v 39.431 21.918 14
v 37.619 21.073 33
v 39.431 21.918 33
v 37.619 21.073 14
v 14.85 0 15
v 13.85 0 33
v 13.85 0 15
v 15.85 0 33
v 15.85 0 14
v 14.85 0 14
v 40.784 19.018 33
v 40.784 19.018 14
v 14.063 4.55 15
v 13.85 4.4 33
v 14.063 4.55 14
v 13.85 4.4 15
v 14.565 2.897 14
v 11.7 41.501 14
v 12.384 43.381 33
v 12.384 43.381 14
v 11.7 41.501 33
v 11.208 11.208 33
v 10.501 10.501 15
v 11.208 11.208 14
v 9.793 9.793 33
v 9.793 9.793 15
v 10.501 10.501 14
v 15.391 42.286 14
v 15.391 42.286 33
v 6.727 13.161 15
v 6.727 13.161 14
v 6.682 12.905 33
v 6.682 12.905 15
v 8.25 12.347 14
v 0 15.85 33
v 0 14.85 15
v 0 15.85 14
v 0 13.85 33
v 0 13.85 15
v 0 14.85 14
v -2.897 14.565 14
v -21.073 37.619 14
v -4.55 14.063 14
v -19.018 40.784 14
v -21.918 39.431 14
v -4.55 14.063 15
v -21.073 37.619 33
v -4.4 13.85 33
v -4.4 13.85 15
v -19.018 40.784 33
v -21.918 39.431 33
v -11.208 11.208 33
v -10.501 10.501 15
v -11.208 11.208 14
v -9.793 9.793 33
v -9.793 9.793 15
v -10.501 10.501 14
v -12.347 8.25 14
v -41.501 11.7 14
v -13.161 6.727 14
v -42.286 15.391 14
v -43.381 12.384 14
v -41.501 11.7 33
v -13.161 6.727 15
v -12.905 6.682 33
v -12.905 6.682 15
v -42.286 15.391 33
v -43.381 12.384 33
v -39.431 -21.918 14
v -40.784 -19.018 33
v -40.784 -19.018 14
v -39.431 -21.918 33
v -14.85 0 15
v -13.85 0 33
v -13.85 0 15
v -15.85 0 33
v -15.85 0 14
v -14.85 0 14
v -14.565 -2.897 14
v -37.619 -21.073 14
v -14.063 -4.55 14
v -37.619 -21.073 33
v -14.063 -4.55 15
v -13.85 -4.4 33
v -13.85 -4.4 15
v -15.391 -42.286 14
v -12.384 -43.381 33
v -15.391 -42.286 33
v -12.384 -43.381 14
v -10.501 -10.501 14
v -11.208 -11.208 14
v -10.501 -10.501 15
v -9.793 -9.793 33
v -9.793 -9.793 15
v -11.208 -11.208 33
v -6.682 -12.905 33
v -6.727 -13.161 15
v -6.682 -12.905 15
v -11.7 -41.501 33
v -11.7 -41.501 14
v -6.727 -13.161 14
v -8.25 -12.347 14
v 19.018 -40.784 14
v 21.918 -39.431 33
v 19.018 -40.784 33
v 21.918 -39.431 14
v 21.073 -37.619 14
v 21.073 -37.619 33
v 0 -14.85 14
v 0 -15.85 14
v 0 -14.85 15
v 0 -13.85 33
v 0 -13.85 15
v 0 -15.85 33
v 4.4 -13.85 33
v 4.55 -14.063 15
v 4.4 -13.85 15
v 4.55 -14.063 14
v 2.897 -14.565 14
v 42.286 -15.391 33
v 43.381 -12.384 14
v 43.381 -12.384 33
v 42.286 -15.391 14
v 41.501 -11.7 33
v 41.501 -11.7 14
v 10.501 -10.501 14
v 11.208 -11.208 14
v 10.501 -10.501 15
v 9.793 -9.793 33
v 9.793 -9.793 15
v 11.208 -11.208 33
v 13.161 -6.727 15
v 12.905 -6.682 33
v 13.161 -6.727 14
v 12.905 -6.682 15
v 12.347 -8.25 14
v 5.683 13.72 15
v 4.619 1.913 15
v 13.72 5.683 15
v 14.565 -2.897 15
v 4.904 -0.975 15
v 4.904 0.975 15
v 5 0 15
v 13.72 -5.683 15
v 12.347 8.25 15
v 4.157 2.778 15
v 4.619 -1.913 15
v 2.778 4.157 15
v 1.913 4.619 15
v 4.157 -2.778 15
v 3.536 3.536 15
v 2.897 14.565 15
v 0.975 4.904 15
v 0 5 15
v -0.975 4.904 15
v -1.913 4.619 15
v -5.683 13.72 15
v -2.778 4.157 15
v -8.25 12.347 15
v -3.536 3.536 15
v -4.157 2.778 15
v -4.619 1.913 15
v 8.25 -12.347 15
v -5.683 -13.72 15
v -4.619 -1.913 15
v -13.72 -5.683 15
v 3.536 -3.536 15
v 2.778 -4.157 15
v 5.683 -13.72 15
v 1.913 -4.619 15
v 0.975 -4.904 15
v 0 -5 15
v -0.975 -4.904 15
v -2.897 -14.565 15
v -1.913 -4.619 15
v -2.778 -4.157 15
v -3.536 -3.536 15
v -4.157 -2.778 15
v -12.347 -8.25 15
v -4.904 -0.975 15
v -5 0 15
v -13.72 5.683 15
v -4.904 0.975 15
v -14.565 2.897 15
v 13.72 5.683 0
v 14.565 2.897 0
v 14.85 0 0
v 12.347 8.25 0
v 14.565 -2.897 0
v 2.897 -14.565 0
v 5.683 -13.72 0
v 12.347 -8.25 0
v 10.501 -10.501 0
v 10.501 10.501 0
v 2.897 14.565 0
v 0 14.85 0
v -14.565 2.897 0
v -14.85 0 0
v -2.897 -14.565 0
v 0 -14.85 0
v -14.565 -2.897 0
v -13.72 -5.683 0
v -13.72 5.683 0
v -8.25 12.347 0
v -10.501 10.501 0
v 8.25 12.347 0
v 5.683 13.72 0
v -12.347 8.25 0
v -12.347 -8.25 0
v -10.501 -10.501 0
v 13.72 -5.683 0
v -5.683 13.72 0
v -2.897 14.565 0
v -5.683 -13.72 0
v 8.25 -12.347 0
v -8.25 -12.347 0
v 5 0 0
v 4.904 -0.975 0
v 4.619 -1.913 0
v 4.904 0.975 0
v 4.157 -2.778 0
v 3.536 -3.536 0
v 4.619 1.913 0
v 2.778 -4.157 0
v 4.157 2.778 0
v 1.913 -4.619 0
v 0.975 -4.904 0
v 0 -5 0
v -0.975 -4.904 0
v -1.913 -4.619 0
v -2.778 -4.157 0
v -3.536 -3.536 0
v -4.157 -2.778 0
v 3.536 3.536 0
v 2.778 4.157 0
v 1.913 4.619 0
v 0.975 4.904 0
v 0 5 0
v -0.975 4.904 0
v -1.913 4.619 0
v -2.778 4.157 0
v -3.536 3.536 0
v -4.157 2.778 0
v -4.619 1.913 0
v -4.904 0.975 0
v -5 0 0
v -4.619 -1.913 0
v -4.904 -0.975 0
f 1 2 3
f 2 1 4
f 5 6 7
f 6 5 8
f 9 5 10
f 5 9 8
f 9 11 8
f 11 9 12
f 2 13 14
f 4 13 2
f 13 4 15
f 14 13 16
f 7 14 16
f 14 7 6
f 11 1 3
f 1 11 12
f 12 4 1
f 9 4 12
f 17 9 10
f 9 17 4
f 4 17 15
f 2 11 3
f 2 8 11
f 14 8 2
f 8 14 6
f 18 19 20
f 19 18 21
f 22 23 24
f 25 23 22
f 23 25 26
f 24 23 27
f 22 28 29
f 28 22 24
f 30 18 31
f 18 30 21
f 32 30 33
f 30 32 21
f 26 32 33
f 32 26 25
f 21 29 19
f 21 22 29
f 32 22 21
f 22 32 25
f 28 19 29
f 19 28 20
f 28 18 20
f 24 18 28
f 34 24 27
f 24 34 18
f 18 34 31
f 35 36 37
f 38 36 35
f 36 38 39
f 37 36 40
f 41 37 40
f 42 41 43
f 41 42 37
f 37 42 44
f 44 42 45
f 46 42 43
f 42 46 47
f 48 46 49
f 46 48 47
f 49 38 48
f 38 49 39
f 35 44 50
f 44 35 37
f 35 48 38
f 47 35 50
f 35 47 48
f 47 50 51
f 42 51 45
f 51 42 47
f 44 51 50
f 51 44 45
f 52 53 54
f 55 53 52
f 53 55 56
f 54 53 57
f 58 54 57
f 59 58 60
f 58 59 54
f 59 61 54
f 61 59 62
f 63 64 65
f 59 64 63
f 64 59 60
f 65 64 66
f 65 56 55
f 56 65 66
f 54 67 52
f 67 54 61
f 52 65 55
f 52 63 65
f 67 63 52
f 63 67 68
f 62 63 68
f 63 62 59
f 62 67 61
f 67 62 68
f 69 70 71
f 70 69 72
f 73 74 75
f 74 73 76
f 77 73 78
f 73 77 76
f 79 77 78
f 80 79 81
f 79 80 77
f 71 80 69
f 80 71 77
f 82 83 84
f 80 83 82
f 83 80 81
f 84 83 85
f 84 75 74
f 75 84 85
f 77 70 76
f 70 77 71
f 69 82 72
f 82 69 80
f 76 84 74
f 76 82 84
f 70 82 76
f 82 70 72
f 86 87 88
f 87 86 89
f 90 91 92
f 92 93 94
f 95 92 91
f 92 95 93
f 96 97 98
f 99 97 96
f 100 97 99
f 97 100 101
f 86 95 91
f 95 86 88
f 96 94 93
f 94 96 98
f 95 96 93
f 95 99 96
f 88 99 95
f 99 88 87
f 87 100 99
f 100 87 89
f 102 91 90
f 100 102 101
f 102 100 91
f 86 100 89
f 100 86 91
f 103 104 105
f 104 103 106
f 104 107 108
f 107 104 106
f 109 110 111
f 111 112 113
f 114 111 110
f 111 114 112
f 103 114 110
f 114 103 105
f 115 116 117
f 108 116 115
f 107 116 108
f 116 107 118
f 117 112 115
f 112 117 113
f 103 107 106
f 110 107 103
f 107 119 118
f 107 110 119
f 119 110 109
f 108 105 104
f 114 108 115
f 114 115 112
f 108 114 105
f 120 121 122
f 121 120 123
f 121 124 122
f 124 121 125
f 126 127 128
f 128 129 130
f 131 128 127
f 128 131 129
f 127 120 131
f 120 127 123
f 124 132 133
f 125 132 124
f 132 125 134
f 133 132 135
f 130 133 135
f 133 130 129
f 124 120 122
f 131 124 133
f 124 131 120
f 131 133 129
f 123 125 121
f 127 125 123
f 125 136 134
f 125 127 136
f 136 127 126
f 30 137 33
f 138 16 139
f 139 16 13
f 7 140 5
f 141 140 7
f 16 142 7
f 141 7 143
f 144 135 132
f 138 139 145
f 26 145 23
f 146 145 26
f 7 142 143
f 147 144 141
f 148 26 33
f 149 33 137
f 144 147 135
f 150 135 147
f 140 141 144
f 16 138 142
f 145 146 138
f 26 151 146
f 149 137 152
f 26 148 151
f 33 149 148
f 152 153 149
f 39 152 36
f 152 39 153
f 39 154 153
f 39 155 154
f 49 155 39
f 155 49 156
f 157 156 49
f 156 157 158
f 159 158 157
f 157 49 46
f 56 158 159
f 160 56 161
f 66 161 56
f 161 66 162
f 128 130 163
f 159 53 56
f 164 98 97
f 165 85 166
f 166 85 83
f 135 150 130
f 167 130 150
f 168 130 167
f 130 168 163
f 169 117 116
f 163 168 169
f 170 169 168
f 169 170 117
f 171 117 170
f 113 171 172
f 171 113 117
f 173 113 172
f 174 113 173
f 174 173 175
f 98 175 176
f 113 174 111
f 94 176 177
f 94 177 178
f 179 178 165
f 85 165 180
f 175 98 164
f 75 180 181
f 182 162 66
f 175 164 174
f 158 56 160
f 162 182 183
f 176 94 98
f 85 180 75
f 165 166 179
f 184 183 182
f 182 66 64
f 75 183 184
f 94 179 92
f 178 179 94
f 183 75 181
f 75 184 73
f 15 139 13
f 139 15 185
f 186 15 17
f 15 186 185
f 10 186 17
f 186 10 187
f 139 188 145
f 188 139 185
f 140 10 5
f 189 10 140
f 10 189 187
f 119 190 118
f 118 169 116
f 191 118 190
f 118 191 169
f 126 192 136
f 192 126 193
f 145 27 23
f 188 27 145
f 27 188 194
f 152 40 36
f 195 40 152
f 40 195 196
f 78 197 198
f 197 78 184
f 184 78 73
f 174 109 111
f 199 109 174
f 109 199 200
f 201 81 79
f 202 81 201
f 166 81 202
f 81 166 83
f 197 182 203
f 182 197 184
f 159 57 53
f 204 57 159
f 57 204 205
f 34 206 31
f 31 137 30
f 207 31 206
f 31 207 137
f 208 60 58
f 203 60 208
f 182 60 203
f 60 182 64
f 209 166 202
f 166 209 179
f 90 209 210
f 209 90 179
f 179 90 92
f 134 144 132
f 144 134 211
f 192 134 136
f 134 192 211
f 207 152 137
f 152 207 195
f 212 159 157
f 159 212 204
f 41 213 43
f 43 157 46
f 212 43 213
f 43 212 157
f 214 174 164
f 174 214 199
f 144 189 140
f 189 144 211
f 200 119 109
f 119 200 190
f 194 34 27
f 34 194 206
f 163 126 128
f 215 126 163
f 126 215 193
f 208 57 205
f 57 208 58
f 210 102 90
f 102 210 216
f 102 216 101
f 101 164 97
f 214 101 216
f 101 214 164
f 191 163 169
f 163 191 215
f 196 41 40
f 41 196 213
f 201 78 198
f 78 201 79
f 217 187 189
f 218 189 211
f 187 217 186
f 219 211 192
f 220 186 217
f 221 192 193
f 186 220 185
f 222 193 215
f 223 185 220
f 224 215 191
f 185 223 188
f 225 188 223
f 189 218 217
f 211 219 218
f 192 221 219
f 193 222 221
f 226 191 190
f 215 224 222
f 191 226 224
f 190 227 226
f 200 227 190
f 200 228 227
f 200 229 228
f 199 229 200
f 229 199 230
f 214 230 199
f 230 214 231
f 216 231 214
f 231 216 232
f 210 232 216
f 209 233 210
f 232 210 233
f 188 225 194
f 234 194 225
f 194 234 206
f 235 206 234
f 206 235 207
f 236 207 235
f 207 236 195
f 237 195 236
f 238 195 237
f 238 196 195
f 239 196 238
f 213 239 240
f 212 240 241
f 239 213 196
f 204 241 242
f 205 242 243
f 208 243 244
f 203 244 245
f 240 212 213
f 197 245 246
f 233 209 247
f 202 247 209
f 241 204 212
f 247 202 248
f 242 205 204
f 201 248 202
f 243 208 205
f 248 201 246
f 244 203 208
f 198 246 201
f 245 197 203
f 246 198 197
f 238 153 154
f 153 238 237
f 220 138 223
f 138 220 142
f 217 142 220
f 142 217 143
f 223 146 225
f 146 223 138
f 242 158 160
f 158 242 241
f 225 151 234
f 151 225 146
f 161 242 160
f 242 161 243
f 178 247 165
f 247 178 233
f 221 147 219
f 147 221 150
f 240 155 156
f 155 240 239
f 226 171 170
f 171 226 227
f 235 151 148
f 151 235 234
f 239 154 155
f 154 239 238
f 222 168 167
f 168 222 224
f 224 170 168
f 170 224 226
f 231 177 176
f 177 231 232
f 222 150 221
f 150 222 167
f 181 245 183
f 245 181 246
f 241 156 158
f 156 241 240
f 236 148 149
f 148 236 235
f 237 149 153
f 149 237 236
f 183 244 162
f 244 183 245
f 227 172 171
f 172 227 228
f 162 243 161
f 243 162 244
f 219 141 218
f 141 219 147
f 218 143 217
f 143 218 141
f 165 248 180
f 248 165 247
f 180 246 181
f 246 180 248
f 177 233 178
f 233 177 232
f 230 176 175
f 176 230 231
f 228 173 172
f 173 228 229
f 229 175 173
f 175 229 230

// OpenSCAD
$fn = 32;

// ----------------------------------------------------------------------
// Impeller: 90 mm, 8 blades, 33 mm tall
// ----------------------------------------------------------------------

// --- parameters (mm) ---
boss_d = 29.7;            // hub diameter
boss_h = 15;              // hub height
rotor_d = 90;             // outer diameter over the blades
vane_count = 8;           // number of blades
blade_t = 2;              // blade thickness
blade_h = 18;             // blade height
blade_in_r = 13.85;       // blade root radius
blade_out_r = 43;         // blade tip radius
sweep = 25;               // blade sweep, degrees
bore_d = 10;              // shaft bore

module hub() {
  cylinder(h = boss_h, d = boss_d);
}

module blade() {
  /* blade swept between two boxes: hull of the root and the tip section */
  hull() {
    translate([blade_in_r, 0, boss_h - 1])
      cube([blade_t, blade_t * 2.2, blade_h + 1], center = false);
    rotate([0, 0, sweep])
      translate([blade_out_r, 0, boss_h - 1])
        cube([blade_t, blade_t * 1.6, blade_h + 1], center = false);
  }
}

module blades() {
  for (i = [0 : vane_count - 1])
    rotate([0, 0, i * 360 / vane_count]) blade();
}

difference() {
  union() {
    hub();
    blades();
  }
  translate([0, 0, -1]) cylinder(h = boss_h + blade_h + 0 + 3, d = bore_d);
}
